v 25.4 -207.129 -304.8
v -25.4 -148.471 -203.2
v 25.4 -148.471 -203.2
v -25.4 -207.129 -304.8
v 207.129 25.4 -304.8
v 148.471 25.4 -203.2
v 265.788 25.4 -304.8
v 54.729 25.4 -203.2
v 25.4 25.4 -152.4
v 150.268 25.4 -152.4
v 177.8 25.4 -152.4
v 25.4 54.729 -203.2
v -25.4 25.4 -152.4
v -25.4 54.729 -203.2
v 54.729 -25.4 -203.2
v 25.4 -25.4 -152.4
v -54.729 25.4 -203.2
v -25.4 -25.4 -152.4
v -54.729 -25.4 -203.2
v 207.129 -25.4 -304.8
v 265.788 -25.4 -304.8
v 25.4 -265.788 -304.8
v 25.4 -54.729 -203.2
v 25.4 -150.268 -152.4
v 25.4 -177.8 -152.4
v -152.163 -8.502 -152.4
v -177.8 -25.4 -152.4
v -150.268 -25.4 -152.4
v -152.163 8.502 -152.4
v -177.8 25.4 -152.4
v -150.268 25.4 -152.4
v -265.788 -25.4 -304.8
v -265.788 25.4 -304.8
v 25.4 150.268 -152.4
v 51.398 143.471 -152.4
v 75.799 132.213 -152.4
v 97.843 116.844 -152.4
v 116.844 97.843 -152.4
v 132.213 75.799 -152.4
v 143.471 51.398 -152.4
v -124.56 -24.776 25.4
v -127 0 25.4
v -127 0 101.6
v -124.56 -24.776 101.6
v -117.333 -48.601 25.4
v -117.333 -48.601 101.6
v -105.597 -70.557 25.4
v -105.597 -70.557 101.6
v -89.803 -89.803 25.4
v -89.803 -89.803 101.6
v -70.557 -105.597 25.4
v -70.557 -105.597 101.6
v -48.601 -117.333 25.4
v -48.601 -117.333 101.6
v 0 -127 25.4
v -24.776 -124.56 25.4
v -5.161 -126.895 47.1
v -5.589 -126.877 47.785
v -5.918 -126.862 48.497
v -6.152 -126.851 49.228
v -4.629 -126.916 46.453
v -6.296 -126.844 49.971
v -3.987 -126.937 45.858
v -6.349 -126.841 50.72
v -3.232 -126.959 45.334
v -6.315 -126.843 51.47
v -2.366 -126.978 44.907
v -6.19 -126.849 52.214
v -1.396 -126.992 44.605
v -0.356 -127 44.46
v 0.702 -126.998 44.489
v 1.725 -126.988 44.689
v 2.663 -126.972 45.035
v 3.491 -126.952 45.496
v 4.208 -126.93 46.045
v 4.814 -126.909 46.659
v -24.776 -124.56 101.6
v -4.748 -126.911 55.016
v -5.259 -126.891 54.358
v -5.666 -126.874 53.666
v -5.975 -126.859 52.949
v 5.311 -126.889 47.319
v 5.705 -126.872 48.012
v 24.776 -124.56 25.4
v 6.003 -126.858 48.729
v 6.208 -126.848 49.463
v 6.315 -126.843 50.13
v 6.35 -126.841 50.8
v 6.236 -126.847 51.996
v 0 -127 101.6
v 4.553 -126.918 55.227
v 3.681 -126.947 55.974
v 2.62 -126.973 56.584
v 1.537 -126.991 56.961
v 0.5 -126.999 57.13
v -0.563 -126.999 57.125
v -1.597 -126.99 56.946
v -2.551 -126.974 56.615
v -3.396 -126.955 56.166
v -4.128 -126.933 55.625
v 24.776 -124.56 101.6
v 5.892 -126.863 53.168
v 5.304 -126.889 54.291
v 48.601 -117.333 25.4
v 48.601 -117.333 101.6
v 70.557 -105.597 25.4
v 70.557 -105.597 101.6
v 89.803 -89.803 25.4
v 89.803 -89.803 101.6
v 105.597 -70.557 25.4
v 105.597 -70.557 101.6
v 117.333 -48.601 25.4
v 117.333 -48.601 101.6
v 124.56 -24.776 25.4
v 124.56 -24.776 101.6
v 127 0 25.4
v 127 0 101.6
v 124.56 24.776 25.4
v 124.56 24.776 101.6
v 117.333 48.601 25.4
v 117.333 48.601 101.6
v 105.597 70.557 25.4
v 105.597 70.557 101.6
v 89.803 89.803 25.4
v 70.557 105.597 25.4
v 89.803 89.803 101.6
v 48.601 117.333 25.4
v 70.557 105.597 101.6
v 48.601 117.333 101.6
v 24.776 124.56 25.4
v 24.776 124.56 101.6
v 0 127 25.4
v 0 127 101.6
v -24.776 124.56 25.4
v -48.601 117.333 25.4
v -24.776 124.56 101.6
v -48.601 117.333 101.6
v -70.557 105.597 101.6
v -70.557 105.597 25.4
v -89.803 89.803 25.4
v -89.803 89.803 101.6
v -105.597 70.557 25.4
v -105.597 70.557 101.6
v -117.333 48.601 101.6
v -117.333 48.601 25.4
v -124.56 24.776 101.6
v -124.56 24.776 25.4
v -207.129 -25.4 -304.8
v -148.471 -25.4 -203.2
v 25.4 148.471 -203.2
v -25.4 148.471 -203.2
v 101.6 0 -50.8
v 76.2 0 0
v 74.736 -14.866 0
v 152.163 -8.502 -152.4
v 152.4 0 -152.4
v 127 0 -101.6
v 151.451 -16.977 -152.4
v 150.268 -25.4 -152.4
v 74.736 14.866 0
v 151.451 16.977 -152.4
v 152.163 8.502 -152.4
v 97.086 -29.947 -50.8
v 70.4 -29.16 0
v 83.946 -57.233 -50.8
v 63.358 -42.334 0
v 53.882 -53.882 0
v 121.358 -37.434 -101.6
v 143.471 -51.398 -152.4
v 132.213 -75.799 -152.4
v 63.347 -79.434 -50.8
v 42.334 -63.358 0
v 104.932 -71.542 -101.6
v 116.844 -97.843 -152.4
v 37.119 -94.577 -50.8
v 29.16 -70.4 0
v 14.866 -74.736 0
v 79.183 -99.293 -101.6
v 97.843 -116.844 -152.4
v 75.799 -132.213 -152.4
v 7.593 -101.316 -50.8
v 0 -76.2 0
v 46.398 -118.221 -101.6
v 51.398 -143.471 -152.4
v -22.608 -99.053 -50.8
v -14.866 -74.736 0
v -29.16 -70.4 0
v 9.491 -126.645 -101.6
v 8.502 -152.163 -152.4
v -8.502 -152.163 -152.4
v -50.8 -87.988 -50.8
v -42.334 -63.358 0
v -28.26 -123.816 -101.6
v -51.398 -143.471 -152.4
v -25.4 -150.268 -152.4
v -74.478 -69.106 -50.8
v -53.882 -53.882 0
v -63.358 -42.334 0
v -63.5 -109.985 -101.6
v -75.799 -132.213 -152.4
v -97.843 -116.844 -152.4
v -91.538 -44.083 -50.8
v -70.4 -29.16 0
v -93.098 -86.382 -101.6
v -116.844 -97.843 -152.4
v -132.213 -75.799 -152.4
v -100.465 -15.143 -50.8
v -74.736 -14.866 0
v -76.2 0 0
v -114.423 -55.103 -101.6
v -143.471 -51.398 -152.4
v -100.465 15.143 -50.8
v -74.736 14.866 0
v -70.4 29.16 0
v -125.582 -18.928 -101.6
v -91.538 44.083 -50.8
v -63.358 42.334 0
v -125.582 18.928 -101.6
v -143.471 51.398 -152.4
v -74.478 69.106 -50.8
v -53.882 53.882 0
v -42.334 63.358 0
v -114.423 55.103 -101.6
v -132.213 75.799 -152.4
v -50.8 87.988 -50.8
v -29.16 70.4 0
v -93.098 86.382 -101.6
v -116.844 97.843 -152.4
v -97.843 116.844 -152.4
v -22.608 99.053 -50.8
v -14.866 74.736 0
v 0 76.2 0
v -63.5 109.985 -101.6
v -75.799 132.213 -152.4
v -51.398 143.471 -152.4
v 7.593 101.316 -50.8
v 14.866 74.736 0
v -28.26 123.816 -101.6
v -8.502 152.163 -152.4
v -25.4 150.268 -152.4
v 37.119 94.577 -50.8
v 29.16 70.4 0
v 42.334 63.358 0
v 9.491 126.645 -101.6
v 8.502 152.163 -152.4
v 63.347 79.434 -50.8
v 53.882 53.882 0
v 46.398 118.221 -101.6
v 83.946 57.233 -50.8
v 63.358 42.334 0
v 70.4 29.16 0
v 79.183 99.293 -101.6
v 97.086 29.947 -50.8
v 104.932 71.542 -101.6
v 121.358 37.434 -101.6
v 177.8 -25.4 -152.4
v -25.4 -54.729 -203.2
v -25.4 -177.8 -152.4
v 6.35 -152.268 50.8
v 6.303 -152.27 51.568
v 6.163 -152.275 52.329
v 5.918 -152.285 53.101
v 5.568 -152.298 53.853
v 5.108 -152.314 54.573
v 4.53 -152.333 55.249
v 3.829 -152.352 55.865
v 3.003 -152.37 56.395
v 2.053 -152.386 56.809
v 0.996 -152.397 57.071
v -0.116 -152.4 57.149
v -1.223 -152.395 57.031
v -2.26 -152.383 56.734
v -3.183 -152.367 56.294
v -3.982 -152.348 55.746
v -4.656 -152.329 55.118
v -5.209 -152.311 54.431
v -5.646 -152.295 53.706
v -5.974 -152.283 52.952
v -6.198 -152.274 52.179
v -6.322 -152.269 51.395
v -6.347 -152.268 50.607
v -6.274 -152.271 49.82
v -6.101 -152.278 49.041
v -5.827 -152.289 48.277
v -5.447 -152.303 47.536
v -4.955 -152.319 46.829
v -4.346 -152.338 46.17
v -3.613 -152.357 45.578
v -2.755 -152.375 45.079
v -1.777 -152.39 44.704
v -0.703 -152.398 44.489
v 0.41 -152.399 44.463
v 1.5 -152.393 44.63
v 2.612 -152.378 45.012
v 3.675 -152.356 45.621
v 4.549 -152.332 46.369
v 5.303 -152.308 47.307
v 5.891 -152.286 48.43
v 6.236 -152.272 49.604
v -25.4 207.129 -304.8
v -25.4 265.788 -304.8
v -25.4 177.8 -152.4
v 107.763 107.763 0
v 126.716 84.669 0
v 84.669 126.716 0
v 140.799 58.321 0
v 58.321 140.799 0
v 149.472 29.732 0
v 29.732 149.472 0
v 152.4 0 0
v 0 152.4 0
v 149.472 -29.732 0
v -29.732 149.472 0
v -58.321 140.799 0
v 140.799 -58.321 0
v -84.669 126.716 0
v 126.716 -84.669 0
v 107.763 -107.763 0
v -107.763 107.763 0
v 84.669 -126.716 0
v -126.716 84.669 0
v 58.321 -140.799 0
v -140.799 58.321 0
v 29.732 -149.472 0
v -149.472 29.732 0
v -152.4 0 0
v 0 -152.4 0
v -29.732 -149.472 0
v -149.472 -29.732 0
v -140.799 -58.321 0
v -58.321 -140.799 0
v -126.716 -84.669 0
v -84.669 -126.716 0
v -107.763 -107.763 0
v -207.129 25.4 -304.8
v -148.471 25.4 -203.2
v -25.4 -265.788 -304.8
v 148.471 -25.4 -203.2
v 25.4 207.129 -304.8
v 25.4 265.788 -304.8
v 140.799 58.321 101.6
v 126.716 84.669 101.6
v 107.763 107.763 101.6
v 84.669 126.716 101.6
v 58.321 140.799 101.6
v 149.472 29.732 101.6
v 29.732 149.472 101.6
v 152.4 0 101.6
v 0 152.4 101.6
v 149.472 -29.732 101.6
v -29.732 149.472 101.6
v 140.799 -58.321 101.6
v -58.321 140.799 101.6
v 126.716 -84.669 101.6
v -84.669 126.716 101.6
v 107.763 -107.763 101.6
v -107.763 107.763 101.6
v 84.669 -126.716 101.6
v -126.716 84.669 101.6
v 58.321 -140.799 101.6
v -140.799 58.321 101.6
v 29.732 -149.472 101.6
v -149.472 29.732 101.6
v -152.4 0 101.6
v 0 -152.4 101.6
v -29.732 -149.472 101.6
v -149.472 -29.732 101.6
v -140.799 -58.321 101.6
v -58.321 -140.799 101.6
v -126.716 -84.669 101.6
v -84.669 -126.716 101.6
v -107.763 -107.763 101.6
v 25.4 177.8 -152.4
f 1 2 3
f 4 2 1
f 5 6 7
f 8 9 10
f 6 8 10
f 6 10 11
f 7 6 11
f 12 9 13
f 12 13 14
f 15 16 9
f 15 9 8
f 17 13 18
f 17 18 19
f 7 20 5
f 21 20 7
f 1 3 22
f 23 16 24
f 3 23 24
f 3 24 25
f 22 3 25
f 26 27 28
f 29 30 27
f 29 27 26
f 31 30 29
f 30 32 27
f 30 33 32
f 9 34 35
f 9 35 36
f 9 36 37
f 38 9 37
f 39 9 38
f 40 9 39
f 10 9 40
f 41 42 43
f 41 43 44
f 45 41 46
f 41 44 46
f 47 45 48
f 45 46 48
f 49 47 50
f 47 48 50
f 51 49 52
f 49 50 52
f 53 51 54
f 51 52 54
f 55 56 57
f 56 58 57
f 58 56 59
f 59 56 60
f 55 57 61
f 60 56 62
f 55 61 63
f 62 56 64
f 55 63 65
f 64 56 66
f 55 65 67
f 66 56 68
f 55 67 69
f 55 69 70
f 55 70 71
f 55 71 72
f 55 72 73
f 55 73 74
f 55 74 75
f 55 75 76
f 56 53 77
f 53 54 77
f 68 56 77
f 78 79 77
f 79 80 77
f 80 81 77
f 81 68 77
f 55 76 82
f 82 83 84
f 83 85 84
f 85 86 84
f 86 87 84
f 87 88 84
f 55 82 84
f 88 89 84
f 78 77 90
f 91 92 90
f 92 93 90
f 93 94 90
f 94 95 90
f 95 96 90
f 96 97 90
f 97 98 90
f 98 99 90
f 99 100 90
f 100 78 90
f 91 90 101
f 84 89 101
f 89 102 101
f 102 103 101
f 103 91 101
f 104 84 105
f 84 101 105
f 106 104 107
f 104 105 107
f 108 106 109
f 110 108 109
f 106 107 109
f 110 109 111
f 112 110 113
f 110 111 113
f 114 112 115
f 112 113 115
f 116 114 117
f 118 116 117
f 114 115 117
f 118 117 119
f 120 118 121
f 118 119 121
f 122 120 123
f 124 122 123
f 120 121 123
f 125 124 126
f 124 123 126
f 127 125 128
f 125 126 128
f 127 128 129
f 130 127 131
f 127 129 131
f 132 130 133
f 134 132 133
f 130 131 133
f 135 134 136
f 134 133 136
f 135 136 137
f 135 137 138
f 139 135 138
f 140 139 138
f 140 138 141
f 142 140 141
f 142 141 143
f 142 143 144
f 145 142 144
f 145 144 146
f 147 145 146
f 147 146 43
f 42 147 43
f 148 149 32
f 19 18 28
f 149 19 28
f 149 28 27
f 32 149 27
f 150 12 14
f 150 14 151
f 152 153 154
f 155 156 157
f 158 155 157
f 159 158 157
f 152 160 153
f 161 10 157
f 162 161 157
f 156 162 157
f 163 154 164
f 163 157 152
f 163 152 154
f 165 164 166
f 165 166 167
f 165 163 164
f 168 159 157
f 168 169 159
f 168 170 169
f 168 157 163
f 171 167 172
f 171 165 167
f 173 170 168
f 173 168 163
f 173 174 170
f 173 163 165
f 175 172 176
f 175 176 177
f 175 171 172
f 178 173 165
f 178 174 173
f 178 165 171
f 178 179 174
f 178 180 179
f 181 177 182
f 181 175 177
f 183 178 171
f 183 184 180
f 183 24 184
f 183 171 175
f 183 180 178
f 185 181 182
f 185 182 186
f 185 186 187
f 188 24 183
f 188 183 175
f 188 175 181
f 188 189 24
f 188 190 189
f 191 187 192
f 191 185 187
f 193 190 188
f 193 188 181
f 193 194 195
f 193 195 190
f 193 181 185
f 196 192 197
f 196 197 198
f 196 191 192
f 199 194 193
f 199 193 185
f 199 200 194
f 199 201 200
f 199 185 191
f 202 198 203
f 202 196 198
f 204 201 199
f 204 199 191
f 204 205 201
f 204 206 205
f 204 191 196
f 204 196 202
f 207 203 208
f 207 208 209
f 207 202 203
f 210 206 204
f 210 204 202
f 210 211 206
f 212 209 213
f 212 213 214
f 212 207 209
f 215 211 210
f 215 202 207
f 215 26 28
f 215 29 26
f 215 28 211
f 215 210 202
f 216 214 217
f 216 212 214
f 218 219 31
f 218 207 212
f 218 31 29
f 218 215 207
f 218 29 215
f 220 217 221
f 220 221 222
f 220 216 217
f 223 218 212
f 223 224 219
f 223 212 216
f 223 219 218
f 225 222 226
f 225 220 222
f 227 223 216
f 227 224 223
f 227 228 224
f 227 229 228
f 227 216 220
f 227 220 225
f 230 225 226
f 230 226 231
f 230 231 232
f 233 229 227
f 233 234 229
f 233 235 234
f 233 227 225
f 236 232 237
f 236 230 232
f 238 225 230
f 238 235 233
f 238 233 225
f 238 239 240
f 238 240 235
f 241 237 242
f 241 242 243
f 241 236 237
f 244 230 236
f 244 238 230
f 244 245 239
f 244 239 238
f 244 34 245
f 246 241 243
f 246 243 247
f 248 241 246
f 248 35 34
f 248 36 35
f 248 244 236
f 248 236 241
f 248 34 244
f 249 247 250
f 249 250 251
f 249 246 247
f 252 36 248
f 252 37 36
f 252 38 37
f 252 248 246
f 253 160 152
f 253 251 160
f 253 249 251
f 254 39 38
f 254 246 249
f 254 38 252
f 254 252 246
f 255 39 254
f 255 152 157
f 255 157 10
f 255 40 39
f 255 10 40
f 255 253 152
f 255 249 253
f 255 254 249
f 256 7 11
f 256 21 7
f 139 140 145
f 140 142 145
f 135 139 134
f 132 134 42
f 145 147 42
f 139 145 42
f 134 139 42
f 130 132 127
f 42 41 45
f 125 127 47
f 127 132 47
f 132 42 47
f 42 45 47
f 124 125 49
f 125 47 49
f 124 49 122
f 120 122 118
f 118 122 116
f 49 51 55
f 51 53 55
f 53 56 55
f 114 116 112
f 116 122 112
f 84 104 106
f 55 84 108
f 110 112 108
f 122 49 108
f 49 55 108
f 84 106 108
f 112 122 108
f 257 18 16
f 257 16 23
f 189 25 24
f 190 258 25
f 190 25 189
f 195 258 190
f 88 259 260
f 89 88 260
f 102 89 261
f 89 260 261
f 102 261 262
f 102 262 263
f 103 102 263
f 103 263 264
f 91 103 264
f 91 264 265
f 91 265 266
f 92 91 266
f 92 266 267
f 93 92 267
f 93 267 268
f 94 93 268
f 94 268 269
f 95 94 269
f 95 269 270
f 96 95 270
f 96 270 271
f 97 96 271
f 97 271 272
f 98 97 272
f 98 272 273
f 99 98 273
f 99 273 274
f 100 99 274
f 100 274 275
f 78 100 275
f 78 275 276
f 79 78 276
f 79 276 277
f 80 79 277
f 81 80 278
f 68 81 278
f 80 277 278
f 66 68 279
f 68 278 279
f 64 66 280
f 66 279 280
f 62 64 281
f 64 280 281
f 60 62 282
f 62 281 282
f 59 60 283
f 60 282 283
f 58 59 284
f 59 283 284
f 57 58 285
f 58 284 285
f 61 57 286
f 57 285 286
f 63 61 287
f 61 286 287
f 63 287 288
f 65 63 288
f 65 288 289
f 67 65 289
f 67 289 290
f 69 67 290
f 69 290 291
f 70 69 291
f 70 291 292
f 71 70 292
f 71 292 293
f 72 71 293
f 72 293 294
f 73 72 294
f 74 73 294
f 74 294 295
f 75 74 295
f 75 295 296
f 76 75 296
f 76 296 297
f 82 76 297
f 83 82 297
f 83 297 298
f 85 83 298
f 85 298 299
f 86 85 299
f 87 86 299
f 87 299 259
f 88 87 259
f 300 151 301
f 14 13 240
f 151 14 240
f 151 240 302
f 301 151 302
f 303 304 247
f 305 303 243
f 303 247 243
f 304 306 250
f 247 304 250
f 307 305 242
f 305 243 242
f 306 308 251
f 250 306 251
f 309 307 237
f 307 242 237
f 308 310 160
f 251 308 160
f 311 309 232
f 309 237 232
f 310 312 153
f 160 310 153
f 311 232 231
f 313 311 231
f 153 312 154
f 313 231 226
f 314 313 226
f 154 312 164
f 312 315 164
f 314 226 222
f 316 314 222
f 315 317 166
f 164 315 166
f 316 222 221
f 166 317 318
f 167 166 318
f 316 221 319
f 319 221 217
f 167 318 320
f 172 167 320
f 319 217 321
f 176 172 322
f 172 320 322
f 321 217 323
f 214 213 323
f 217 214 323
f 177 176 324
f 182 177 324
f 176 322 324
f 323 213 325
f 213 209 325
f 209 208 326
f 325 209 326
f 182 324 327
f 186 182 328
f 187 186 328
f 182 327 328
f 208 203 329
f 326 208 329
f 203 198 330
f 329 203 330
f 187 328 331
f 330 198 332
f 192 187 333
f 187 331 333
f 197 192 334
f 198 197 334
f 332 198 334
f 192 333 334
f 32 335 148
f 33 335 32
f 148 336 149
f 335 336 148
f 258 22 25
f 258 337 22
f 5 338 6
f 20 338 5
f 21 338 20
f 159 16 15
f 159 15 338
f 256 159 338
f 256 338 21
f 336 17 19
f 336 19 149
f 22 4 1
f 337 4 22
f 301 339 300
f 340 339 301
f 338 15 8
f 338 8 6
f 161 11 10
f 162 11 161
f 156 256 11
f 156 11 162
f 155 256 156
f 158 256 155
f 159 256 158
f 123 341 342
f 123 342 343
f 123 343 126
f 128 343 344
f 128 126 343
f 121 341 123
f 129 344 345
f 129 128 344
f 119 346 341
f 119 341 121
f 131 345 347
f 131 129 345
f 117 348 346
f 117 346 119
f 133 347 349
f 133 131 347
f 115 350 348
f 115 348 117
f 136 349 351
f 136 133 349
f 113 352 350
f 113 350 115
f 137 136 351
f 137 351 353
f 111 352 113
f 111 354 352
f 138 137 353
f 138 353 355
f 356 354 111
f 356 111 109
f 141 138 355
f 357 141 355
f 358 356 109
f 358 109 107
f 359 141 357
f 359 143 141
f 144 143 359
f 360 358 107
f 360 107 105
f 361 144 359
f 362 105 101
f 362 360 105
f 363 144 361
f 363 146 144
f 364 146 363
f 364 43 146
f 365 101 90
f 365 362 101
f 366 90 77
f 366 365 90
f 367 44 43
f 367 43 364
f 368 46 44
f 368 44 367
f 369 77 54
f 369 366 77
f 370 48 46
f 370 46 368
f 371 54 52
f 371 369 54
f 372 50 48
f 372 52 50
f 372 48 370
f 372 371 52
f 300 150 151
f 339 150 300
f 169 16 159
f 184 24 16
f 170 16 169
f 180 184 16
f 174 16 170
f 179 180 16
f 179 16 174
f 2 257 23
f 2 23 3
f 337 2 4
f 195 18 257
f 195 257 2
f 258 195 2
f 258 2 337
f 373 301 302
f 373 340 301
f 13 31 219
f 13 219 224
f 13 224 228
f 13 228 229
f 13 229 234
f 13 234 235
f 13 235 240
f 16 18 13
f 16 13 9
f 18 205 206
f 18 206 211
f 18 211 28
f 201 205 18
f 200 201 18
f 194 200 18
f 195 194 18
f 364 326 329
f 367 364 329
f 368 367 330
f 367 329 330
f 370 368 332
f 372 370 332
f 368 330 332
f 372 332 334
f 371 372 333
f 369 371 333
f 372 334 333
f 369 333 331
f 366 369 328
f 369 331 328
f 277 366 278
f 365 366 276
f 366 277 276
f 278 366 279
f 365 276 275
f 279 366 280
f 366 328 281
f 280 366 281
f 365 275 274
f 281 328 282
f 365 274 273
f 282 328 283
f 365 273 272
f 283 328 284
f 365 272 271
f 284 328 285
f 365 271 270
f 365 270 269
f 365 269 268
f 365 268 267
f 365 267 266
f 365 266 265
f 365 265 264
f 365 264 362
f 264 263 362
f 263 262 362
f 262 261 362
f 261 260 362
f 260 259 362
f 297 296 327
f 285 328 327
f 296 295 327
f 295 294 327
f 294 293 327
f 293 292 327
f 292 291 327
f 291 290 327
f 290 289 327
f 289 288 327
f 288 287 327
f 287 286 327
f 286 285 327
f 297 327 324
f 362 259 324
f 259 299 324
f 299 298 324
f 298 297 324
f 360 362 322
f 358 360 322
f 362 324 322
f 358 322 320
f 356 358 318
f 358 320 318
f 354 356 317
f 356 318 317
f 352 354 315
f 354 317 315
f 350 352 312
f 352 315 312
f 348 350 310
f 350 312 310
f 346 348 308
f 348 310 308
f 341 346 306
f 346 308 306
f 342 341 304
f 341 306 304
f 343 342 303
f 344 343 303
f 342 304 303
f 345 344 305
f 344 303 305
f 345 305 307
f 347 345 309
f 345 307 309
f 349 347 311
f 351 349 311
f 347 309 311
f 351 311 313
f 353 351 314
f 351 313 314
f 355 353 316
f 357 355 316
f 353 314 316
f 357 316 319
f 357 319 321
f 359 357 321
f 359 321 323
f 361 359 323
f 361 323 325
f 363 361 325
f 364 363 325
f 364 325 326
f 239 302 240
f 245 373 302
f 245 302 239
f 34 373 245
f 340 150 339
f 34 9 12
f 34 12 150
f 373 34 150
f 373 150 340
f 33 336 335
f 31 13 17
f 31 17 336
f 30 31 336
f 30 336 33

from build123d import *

# Parameters (mm, degrees)
F0_W      = 25.4
F0_H      = 76.2
F3_R      = 6.35
F4_DEPTH  = 50.8
F5_R      = 76.2
F7_R      = 152.4
F10_DEPTH = 25.4
F11_COUNT = 4


with BuildPart() as f1:
    # F0 (on Front) → F1 (revolve)
    with BuildSketch(Plane.XZ):
        with Locations((-139.7, 63.5)):
            Rectangle(F0_W, F0_H)
        Polygon((-152.4, 0), (0, 0), (0, 25.4), (-127, 25.4), (-152.4, 25.4), align=None)
    revolve(axis=Axis((0, 0, 12.7), (0, 0, 1)))

    # F3 (on offset) → F4 (cut)
    with BuildSketch(Plane.XZ.offset(152.4)):
        with Locations((0, 50.8)):
            Circle(F3_R)
    extrude(amount=-F4_DEPTH, mode=Mode.SUBTRACT)

    # F5 (on face) → F8 section 0
    with BuildSketch(Plane(origin=(0, 0, 0), x_dir=(1, 0, 0), z_dir=(0, 0, -1))):
        Circle(F5_R)
    # F7 (on offset) → F8 section 1
    with BuildSketch(Plane(origin=(0, 0, -152.4), x_dir=(1, 0, 0), z_dir=(0, 0, -1))):
        Circle(F7_R)
    loft()



with BuildPart() as f10:
    # F9 (on Right) → F10 (new body, symmetric)
    with BuildSketch(Plane.YZ):
        Polygon((177.8, -152.4), (25.4, -152.4), (54.7293936748, -203.2), (148.4706063252, -203.2), (207.1293936748, -304.8), (265.7881810245, -304.8), align=None)
    extrude(amount=F10_DEPTH, both=True)


with BuildPart() as f1_1:
    add(f1.part)

    add(f10.part)  # F11 merges F10
    # F11: F10 ×4 about axis
    f11_axis = Axis((0, 0, 0), (0, 0, -1))
    for i in range(1, F11_COUNT):
        add(f10.part.rotate(f11_axis, i * 360 / F11_COUNT))


solid = f1_1.part
